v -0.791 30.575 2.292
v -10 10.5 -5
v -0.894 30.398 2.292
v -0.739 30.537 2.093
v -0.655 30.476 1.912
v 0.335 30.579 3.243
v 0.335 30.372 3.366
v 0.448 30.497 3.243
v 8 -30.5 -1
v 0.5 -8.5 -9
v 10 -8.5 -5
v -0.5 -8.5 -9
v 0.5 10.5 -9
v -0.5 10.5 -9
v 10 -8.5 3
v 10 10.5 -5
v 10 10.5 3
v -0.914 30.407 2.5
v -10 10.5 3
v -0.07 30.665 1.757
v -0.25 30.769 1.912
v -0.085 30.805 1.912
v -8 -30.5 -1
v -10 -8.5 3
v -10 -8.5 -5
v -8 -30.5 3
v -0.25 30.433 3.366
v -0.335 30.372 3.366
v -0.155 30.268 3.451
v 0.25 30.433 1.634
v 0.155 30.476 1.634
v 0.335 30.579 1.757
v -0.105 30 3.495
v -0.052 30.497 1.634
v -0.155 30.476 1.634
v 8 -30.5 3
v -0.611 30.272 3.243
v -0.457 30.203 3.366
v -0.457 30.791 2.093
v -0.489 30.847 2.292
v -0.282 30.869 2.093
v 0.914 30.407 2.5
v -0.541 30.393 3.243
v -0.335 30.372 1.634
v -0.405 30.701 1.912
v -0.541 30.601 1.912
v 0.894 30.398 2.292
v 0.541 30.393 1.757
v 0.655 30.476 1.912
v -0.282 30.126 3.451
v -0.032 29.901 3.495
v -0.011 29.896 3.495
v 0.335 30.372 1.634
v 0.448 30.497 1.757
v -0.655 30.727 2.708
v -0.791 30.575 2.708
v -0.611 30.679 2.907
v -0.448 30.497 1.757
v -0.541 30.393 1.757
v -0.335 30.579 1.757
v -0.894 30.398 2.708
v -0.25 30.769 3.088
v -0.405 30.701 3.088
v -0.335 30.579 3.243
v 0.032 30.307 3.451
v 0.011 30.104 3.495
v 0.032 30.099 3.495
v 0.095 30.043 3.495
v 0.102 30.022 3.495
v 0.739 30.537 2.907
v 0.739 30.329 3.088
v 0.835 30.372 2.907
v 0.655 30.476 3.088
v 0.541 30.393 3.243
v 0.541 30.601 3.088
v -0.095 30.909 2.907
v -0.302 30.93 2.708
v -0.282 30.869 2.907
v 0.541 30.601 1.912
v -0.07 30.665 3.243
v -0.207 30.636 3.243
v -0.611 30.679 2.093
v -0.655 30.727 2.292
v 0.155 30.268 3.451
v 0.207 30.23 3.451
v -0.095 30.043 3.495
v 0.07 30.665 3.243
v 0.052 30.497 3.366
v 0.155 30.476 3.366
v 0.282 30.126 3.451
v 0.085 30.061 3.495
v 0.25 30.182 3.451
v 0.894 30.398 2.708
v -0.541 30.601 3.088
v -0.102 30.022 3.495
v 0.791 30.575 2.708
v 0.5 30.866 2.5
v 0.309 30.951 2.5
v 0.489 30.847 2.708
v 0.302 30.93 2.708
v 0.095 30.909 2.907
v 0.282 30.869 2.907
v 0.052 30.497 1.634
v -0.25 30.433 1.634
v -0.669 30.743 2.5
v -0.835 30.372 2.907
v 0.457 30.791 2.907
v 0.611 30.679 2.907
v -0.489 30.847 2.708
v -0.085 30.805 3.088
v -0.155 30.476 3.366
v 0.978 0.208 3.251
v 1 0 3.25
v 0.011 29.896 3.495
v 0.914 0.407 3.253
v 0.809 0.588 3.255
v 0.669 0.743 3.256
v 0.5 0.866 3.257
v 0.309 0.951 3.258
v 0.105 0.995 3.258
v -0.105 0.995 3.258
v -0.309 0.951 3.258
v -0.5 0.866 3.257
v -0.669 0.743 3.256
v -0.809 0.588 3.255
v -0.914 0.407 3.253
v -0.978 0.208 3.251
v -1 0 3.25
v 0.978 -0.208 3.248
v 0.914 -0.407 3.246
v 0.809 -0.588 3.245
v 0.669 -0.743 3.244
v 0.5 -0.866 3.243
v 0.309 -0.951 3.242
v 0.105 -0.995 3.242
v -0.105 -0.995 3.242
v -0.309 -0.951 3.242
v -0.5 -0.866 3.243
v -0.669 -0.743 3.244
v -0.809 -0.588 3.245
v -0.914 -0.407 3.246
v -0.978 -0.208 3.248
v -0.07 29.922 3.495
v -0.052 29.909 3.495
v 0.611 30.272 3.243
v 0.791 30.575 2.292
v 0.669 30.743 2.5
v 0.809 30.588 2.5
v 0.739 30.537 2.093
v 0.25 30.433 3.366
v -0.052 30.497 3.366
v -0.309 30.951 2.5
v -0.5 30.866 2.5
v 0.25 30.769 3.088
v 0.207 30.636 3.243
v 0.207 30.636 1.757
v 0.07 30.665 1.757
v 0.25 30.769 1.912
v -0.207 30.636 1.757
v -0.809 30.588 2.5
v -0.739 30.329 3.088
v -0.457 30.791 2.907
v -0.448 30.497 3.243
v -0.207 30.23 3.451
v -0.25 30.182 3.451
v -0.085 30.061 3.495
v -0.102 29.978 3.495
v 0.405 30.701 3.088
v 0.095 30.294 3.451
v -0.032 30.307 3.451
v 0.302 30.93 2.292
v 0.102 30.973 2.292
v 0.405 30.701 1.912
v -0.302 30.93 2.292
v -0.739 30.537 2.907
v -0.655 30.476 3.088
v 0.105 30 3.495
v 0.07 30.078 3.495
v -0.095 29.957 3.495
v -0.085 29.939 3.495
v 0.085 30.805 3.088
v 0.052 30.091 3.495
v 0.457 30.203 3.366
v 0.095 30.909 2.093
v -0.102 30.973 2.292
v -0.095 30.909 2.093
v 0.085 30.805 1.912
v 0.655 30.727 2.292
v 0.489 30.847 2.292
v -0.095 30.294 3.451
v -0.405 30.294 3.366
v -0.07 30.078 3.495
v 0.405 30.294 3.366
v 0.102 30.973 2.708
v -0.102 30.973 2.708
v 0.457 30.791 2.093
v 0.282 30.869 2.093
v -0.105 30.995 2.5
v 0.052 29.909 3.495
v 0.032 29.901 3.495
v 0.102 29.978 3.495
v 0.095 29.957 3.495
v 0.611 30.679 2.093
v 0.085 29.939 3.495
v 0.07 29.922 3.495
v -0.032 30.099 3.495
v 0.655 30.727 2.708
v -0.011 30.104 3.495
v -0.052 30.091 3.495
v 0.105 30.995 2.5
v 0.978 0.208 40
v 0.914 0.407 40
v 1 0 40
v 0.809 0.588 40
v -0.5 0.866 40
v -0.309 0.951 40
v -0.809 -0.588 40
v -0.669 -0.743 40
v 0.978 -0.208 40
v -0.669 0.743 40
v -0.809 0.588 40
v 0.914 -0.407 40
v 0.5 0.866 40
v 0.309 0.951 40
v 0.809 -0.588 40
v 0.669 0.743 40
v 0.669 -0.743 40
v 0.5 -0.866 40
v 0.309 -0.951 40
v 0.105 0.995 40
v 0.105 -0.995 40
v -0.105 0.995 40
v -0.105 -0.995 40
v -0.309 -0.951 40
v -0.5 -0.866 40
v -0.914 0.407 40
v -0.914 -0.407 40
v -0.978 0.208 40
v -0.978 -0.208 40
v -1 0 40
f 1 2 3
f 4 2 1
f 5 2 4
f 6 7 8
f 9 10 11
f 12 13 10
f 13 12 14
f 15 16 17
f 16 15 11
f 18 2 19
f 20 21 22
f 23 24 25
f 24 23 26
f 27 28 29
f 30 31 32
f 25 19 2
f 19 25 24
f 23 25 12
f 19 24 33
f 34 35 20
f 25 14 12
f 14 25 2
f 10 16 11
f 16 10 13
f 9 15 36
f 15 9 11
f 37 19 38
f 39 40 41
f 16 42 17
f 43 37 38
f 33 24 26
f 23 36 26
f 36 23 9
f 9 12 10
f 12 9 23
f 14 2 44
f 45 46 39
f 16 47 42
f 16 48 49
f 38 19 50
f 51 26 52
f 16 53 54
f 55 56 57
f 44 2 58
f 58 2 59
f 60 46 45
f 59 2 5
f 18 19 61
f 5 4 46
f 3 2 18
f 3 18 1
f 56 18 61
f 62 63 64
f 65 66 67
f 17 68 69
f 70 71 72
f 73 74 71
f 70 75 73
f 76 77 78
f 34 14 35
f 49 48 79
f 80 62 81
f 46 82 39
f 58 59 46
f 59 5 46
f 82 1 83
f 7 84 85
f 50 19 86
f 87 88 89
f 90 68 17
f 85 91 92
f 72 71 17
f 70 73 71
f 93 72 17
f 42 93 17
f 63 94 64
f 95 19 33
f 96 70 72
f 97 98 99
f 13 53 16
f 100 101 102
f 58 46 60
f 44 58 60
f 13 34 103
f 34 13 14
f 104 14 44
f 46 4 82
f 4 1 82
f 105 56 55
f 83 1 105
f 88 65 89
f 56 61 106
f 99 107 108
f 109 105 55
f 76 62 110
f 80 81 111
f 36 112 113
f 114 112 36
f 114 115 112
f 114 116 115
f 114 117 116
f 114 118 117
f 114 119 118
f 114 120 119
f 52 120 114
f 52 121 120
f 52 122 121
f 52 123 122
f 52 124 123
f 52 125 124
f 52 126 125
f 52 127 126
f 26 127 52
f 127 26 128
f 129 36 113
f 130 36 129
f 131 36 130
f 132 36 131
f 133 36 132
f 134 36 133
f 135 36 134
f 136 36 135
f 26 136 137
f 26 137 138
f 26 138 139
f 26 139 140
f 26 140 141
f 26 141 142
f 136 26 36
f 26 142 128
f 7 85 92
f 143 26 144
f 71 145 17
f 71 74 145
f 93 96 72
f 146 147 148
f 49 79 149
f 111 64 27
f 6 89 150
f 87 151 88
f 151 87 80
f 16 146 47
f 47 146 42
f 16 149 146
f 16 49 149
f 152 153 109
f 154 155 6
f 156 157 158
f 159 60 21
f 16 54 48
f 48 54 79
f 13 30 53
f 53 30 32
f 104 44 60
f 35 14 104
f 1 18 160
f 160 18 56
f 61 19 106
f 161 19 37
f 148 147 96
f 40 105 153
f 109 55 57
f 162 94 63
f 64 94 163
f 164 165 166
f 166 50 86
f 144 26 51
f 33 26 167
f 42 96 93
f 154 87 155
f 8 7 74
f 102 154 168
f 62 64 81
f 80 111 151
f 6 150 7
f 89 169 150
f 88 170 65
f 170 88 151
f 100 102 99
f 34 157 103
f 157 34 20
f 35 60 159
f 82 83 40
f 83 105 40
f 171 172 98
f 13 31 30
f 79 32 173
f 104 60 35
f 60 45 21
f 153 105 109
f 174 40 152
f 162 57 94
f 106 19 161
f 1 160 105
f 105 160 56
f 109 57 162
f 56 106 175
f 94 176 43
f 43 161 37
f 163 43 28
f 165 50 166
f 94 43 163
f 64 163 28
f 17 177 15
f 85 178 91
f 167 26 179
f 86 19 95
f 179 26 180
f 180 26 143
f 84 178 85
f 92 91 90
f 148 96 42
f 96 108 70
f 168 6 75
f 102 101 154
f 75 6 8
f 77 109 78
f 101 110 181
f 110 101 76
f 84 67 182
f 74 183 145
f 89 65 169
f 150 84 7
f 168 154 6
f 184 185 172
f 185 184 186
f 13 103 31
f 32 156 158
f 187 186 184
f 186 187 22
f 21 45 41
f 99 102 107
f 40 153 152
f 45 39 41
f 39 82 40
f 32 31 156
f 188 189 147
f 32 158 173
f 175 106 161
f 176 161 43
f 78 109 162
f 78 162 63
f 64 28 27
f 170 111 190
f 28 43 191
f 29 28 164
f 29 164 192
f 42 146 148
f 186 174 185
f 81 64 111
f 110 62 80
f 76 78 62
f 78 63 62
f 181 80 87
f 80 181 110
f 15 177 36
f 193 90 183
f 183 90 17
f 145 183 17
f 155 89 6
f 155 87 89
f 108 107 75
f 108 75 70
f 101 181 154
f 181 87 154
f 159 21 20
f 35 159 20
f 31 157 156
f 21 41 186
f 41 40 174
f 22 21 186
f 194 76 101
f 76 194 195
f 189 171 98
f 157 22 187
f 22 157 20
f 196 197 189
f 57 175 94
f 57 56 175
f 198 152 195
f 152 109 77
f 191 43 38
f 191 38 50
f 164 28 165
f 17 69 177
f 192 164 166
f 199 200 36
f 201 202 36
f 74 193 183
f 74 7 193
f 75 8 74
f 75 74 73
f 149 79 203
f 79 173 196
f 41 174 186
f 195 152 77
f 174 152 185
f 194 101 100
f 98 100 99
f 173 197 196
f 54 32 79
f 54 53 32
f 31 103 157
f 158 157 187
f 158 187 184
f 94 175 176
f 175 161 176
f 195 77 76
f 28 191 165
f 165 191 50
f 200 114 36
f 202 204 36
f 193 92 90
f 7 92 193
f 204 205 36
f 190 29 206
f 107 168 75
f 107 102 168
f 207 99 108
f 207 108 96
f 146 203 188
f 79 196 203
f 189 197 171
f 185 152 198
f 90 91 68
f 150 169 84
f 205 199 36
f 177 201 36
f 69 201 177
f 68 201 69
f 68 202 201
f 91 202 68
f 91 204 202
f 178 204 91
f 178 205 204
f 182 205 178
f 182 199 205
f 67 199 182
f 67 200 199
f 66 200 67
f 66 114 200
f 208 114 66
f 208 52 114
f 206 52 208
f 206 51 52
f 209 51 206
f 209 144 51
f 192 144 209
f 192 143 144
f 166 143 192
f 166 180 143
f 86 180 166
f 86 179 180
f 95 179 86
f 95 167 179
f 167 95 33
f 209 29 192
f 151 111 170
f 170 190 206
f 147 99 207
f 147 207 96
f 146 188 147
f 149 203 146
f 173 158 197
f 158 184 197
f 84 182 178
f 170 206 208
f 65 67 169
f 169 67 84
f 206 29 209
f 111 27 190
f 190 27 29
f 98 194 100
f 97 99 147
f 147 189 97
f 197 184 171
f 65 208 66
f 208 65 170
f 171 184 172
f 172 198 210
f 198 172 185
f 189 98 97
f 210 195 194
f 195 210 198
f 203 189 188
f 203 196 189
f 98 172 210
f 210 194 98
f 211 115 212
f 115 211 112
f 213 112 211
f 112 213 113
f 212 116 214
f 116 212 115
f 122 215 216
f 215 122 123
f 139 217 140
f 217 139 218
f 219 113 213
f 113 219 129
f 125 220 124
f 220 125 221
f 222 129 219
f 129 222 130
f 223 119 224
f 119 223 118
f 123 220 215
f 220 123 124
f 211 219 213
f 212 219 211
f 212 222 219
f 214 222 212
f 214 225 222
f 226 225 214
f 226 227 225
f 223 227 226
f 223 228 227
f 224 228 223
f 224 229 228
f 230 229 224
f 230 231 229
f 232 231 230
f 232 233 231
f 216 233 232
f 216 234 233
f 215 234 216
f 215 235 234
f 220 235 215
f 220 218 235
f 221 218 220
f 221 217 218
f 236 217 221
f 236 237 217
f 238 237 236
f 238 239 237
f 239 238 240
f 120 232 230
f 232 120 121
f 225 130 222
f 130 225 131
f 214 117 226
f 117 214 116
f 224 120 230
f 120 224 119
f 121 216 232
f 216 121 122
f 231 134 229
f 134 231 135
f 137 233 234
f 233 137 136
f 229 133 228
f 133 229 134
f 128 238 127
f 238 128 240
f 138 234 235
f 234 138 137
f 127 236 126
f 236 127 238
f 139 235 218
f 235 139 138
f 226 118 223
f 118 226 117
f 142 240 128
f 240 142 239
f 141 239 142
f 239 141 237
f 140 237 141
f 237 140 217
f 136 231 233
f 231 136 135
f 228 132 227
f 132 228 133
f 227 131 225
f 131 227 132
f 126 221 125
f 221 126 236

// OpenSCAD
// Volume: 8568.706291191585, SurfaceArea: 3162.4228456679207
// Hull Example
// The hull of a toy sailboat
$fs = .1;
hull(){
    translate([0,30,2.5]) sphere(1); //bow
    translate([0,10,-1]) cube([20,1,8],true); //1st bulkhead
    translate([0,10,-5]) cube([1,1,8],true); //1st keel
    translate([0,-8,-1]) cube([20,1,8],true); //2nd bulkhead
    translate([0,-8,-5]) cube([1,1,8],true); //2nd keel
    translate([0,-30,1]) cube([16,1,4],true); //stern
}
    cylinder(40,1,1); //Mast


// written by Paul Young, 2022
//  paulwhy.2@gmail.com

// To the extent possible under law, the author(s) have dedicated all
// copyright and related and neighboring rights to this software to the
// public domain worldwide. This software is distributed without any
// warranty.
//
// You should have received a copy of the CC0 Public Domain
// Dedication along with this software.
// If not, see <http://creativecommons.org/publicdomain/zero/1.0/>.
